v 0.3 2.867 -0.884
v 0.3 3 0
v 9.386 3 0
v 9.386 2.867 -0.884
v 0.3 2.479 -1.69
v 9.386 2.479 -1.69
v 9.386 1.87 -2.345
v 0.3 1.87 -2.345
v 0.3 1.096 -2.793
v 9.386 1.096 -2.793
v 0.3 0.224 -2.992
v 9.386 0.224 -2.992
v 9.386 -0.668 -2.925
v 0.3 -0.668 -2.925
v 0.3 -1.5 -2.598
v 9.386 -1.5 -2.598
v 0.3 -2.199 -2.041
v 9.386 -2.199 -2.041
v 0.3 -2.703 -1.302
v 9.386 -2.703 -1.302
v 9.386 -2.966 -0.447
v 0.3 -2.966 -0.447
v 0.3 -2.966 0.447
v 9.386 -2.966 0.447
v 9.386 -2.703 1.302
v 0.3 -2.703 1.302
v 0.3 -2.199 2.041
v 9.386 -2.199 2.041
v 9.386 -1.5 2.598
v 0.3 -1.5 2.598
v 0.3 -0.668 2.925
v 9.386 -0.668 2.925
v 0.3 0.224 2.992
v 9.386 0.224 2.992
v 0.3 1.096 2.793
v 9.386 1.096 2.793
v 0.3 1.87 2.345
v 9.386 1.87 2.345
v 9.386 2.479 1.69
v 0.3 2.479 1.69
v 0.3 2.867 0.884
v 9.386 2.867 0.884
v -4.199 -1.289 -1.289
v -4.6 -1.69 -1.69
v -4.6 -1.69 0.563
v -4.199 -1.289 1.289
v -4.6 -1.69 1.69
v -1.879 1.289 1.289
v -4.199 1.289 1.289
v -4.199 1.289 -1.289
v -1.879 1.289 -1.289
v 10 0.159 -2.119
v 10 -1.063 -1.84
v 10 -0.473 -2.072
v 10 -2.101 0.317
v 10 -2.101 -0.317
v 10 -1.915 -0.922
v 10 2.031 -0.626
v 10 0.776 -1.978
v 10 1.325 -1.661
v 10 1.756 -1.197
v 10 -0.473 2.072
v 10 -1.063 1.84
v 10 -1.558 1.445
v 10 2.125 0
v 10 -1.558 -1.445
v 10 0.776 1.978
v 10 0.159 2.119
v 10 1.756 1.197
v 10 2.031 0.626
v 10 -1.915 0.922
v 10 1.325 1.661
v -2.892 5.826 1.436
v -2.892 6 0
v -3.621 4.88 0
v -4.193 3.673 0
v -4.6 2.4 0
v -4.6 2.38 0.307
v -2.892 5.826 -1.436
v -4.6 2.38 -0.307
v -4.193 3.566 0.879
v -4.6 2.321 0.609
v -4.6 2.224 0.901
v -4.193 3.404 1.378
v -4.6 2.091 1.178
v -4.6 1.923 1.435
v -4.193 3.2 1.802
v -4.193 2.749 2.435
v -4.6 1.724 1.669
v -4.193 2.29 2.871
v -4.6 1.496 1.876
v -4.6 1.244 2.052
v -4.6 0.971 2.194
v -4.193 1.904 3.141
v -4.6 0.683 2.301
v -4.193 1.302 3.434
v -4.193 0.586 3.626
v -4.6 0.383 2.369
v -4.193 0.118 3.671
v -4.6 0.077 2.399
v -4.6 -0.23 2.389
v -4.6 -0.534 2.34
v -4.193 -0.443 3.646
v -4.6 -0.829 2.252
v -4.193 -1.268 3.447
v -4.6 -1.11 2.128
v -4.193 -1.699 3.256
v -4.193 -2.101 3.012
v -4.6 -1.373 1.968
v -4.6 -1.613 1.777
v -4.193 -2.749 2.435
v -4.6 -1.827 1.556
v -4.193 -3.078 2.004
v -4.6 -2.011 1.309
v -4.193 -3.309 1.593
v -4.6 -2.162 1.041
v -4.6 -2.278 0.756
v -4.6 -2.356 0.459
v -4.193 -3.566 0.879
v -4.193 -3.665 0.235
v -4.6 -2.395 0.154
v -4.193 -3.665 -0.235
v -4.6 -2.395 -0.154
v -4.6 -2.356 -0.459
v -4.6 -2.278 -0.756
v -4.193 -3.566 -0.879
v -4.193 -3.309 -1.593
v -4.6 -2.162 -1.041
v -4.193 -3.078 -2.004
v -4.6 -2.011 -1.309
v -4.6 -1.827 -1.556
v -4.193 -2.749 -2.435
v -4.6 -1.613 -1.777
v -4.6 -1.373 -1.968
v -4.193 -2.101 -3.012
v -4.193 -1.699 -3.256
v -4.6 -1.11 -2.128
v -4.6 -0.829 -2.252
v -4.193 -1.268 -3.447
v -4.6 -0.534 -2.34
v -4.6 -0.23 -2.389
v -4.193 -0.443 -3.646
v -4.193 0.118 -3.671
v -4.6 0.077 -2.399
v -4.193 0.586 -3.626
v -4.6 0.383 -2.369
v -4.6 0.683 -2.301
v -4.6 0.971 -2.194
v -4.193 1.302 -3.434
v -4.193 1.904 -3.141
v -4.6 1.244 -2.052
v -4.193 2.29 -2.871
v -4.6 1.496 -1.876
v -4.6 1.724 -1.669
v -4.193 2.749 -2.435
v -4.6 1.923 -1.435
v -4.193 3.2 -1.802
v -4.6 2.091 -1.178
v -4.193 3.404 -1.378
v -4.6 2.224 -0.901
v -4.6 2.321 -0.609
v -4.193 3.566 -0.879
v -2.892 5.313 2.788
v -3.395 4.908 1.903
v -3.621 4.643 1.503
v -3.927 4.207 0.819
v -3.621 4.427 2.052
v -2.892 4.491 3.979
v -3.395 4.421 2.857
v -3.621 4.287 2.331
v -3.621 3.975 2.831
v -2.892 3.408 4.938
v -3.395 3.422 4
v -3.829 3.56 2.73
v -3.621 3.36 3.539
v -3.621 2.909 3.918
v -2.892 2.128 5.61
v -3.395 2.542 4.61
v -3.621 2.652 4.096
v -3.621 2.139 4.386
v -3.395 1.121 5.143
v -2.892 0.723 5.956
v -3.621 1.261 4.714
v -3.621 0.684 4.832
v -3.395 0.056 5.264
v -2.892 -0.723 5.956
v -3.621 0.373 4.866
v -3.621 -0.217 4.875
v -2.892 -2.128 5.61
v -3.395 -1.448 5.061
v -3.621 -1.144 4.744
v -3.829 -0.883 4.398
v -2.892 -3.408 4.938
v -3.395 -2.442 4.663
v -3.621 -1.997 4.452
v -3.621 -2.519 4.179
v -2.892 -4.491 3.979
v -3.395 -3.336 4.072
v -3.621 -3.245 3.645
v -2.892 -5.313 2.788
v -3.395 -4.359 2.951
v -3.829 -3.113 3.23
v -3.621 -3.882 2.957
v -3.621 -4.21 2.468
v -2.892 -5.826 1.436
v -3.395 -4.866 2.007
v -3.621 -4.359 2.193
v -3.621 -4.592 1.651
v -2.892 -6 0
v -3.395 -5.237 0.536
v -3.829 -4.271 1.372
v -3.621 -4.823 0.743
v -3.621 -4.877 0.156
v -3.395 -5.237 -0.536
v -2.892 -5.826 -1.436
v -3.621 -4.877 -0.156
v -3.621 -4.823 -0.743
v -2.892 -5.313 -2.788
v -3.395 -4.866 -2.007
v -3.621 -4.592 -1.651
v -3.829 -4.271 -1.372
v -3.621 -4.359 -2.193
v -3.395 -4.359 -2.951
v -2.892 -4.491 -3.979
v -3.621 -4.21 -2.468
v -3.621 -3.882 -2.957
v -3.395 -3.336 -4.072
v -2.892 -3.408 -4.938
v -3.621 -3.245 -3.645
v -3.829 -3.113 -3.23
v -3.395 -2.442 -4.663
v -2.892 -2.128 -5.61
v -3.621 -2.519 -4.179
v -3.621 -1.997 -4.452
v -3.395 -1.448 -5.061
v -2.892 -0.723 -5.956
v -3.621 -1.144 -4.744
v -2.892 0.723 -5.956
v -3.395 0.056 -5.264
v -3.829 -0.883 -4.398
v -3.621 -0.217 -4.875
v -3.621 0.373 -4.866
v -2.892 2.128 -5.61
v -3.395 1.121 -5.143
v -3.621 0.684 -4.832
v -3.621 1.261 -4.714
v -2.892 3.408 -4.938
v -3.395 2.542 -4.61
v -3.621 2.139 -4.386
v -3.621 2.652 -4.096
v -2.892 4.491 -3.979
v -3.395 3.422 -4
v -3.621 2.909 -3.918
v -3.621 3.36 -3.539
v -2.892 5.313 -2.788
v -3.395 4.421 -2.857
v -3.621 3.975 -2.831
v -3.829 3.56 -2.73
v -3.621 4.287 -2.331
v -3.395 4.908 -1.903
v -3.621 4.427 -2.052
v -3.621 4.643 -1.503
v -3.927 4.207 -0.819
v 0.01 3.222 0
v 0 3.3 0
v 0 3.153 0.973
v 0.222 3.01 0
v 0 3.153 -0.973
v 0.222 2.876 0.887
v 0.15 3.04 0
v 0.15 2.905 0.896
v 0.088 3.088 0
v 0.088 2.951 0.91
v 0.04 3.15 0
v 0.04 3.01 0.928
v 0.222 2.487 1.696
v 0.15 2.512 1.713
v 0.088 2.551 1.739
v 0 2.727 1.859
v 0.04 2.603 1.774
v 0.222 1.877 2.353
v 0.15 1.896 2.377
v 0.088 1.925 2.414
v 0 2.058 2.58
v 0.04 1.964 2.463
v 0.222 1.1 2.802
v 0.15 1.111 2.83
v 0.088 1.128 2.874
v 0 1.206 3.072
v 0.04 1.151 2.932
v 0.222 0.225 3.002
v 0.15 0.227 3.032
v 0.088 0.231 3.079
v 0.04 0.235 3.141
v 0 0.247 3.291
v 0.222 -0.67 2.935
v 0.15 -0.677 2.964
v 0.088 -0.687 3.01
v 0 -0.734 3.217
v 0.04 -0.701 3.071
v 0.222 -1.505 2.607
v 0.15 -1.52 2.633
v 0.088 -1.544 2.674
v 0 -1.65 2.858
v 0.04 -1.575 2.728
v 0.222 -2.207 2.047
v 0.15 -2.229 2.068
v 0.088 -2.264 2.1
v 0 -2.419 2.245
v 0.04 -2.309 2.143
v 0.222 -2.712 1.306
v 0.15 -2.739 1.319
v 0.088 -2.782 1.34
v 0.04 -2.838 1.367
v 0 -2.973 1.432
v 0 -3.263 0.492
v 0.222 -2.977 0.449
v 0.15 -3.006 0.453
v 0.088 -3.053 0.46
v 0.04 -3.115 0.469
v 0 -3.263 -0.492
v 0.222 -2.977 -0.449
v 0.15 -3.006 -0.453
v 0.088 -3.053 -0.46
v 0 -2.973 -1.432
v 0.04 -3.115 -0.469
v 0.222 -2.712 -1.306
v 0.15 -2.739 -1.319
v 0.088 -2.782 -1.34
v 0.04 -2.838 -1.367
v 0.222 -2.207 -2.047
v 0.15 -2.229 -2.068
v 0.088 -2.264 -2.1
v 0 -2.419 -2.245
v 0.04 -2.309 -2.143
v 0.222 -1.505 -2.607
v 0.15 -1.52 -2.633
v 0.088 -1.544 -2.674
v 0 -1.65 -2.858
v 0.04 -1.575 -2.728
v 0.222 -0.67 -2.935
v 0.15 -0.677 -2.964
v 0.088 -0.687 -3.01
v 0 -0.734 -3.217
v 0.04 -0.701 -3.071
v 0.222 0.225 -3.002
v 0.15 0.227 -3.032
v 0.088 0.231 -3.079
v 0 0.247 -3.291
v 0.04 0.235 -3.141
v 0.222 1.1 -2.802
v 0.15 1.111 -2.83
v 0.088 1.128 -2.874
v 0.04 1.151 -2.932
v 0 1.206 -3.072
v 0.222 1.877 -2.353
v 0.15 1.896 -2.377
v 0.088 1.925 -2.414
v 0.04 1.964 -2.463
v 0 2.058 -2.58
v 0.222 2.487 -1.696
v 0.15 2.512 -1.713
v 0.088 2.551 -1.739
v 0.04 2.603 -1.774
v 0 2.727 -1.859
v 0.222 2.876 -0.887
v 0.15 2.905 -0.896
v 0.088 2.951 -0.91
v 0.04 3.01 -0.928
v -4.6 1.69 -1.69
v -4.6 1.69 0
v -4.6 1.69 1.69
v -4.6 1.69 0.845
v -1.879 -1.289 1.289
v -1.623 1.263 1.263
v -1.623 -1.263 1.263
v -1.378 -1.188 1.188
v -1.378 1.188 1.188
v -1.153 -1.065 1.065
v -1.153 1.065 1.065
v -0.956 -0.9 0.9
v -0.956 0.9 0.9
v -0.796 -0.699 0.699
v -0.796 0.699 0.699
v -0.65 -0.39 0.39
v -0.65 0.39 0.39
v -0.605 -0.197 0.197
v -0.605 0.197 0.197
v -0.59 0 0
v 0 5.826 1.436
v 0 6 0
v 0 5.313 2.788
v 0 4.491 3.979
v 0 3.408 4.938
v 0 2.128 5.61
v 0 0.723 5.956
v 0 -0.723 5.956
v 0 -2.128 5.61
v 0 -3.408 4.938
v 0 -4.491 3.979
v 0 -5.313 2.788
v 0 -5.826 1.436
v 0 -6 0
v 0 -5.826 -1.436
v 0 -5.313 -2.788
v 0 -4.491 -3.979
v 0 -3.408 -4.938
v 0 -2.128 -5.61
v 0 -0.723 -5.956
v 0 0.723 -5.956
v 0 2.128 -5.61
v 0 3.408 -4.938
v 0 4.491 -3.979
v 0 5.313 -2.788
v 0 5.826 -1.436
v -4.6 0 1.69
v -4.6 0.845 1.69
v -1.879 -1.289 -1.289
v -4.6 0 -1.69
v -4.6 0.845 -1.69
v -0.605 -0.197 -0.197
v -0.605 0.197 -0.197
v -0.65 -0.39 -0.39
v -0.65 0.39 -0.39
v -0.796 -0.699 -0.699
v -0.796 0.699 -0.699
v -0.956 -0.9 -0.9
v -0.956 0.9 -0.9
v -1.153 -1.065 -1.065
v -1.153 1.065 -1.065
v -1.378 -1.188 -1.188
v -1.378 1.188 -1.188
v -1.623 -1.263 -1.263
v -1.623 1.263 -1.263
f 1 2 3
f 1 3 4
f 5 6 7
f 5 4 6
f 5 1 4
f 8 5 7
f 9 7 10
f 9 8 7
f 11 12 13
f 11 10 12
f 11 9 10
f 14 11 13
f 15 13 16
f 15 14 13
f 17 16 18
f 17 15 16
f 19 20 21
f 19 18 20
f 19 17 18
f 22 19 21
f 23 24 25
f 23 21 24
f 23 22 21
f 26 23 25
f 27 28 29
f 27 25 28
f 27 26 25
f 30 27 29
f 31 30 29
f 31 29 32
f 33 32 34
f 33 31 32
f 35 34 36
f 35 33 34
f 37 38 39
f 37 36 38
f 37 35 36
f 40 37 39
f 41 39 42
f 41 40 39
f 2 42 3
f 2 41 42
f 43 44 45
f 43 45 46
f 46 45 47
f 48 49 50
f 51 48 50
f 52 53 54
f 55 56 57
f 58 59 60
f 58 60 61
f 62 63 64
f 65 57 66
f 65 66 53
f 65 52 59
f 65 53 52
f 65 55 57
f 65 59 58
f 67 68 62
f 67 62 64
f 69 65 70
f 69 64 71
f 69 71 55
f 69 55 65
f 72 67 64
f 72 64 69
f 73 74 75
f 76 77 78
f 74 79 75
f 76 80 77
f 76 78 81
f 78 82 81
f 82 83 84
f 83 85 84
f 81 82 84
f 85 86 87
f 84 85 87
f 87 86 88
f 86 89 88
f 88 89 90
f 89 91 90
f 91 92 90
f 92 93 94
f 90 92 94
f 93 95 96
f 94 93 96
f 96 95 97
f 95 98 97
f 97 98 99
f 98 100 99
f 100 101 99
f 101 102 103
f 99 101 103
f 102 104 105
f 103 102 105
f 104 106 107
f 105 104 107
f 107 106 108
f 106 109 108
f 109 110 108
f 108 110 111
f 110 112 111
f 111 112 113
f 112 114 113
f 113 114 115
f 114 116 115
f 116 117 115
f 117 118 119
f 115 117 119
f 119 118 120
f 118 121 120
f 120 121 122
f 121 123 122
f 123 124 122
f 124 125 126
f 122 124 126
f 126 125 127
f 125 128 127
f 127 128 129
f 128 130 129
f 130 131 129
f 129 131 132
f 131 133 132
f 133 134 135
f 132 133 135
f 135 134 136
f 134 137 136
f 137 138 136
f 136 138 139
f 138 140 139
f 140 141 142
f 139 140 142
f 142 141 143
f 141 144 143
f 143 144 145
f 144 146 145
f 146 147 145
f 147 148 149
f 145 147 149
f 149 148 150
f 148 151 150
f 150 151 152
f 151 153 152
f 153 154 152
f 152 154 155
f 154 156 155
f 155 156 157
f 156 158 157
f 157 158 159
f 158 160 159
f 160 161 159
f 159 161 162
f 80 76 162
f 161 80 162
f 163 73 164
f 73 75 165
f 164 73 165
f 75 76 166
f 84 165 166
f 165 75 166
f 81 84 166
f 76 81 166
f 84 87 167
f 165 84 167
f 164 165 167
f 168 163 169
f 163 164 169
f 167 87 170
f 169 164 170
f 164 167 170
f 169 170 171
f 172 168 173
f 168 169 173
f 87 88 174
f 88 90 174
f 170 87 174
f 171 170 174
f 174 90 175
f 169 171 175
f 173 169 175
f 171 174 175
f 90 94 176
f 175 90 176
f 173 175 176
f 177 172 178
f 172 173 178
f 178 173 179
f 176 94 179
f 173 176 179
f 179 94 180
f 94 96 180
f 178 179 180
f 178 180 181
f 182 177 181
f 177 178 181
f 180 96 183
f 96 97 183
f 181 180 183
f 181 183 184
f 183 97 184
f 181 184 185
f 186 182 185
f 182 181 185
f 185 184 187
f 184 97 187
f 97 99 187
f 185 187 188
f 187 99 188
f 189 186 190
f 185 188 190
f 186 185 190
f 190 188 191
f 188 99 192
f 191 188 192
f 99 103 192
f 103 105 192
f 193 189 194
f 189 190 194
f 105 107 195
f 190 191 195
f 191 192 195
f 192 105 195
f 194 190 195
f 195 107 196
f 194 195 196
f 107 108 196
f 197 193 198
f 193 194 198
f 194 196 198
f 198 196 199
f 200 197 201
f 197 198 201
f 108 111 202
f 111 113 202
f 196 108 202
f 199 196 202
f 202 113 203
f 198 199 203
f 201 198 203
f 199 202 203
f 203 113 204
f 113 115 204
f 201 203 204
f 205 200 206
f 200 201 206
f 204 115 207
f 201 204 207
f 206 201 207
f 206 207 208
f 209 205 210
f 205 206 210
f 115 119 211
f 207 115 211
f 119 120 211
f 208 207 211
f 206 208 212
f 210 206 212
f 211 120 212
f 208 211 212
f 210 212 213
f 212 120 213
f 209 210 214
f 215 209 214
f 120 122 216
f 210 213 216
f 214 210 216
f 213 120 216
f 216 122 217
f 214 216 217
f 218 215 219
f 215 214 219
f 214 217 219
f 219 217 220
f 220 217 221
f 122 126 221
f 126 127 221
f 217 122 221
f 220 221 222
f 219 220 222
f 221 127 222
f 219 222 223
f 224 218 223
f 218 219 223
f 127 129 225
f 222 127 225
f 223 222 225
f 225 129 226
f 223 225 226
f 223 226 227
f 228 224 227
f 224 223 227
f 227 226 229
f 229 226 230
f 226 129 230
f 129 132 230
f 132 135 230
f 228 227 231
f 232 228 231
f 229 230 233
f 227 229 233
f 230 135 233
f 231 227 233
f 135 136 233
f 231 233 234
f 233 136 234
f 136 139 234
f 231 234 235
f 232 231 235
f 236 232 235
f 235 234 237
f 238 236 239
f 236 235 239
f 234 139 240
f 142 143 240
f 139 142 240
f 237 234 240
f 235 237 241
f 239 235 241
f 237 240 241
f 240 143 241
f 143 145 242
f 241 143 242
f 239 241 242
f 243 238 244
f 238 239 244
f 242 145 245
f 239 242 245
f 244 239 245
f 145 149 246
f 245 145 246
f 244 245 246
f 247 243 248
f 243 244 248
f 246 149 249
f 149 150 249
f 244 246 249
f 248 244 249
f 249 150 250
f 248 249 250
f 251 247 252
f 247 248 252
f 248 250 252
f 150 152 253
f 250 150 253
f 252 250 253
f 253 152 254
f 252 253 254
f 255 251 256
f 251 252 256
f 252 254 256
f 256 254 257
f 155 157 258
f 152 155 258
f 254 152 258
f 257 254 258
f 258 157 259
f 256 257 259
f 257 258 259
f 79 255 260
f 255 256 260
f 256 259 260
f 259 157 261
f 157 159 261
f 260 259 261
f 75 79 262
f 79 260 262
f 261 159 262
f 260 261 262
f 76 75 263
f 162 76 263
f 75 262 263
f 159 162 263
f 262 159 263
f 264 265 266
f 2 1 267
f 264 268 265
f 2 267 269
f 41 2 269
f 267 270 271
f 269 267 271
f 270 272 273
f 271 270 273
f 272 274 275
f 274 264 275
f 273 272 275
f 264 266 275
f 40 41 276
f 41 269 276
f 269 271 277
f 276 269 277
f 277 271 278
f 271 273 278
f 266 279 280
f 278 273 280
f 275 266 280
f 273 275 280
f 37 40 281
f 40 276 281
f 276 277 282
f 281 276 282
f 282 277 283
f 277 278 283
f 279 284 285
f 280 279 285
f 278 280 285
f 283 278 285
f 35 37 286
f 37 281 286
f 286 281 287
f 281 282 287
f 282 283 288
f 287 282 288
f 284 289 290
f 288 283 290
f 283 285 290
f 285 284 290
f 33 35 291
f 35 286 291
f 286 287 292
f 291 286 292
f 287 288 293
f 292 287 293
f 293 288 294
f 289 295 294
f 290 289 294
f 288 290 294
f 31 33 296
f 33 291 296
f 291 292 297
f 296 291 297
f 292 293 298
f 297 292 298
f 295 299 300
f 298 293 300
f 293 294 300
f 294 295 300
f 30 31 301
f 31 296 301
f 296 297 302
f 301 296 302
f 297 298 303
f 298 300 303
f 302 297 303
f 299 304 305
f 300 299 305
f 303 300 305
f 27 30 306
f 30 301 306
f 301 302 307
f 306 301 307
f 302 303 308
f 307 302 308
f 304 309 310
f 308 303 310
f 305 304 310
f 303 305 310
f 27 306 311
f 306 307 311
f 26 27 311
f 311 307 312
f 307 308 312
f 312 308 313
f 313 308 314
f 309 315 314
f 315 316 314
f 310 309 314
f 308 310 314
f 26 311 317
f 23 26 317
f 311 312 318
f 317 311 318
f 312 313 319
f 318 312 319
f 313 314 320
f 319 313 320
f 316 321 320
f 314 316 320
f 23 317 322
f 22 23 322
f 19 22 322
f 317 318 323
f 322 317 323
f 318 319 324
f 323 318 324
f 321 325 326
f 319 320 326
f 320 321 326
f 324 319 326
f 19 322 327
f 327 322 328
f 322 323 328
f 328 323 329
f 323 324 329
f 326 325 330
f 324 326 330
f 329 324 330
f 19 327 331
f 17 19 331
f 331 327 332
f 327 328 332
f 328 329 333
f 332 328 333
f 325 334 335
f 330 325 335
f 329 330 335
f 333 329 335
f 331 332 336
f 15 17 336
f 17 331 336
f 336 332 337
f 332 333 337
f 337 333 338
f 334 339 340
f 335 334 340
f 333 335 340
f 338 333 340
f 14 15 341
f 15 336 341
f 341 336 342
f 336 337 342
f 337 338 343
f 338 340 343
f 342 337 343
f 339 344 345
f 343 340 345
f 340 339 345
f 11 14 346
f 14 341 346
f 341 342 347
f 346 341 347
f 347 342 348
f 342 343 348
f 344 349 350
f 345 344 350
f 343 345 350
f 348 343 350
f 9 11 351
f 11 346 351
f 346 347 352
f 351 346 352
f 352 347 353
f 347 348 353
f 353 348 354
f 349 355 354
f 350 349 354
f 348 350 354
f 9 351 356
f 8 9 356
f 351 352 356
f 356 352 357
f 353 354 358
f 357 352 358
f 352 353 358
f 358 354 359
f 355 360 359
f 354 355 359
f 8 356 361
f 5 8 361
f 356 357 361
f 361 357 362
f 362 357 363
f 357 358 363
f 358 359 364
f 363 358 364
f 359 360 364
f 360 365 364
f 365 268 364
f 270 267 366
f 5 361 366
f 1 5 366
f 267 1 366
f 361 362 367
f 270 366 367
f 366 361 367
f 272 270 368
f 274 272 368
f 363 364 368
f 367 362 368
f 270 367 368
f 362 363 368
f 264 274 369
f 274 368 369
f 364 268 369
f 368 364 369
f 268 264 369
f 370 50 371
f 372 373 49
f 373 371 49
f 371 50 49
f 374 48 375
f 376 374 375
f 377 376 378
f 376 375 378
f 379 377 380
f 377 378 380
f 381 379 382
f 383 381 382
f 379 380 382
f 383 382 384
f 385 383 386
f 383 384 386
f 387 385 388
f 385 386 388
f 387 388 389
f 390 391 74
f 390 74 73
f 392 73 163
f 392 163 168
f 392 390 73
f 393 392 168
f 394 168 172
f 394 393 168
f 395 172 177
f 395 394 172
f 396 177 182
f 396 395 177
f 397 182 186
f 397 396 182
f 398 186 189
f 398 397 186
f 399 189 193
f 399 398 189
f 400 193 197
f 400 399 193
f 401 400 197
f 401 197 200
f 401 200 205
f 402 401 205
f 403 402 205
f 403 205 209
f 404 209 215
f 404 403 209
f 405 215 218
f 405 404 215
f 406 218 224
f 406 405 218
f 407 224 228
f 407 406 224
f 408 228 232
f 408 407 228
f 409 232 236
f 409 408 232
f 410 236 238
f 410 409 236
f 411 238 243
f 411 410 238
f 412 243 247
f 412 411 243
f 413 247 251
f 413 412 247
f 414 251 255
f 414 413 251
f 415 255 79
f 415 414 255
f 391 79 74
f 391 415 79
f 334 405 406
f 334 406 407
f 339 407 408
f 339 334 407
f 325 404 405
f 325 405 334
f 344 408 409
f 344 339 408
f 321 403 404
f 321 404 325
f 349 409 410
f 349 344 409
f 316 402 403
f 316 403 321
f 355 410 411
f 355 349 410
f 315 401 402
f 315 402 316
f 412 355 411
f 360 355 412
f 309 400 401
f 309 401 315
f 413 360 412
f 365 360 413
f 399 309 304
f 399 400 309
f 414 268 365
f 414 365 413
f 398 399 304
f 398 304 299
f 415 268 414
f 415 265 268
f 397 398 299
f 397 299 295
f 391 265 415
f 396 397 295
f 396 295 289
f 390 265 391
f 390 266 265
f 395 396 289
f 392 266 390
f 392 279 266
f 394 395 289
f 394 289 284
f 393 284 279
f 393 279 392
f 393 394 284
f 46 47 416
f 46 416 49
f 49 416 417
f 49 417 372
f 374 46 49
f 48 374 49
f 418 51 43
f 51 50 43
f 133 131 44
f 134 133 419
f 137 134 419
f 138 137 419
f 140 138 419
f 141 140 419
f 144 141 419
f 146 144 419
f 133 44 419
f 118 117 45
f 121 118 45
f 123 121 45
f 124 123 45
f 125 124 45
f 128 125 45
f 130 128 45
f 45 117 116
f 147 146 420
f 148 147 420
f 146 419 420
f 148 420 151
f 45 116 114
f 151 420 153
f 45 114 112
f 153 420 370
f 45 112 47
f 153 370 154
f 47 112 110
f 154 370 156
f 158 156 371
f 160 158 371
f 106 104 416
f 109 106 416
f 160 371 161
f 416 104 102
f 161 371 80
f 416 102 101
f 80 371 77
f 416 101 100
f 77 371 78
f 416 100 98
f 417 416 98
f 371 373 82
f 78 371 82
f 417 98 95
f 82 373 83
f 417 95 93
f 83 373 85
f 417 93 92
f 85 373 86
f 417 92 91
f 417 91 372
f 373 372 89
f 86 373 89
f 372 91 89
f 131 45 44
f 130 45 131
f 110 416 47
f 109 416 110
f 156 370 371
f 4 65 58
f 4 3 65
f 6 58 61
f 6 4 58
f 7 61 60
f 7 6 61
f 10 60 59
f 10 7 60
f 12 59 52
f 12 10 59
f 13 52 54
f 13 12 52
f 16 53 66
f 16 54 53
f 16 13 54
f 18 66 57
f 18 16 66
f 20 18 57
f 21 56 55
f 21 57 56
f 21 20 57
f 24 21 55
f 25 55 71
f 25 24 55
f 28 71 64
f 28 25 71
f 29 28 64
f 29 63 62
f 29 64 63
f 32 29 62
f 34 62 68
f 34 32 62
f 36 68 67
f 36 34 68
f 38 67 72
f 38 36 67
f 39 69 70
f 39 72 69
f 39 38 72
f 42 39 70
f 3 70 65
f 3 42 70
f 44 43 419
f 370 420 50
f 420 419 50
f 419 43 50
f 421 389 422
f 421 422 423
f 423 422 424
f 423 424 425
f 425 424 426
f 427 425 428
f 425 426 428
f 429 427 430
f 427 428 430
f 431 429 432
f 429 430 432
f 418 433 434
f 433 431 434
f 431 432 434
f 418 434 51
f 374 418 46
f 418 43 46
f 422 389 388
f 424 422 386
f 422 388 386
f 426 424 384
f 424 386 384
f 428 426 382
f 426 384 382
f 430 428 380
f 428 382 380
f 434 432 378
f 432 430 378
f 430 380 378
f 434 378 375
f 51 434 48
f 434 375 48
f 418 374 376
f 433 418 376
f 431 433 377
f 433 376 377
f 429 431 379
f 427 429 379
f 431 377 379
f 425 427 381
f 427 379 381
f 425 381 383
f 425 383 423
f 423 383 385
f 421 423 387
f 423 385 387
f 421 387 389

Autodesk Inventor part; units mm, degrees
ref_plane "YZ Plane" through (0, 0, 0) normal (1, 0, 0) x (0, 1, 0)
sketch "Sketch1" plane through (0, 0, 0) normal (0, 0, 1) x (1, 0, 0)
  line L0 (-0.59, 0) -> (10, 0)
  line L1 (10, 0) -> (10, 3)
  line L2 (10, 3) -> (0, 3)
  line L3 (0, 3) -> (0, 6)
  line L4 (-8.1003, 0) -> (13.0167, 0) projected
  line L5 (0, -1.2172) -> (0, 7.3031) projected
  line L6 (-4.6, 2.3998) -> (-5.0836, 2.3998) construction
  line L7 (-4.6, 0) -> (-0.59, 0)
  line L8 (0, 0) -> (-0.59, 0)
  line L9 (-4.6, 0) -> (-4.6, 6)
  arc A0 (-2.8922, 6) -> (-4.6, 2.3998) centre (5.1078, 0) ccw
  line L10 (-4.6, 6) -> (0, 6)
  dimension "d0" = 10
  dimension "d1" = 6
  dimension "d2" = 12
  dimension "d4" = 4.7996
  dimension "d13" = 4.6
  dimension "d14" = 4.01
  dimension "d46" = 10
  dimension "d47" = 0
revolve "Body" add sketch "Sketch1" angle 360 about axis through (-0.59, 0, 0) along (1, 0, 0) contours L4 L9 A0 L10 L3 L5 L0 | L5 L2 L1 L0
ref_plane "IDS_WORKPLANE{1}" through (-4.6, 0, 0) normal (1, 0, 0) x (0, 0, -1)
sketch "Sketch2" plane through (-4.6, 0, 0) normal (1, 0, 0) x (0, 0, -1)
  line L0 (0, -8.4) -> (0, 8.4) projected
  line L1 (8.4, 0) -> (-8.4, 0) projected
  line L2 (-1.289, 1.289) -> (1.289, 1.289)
  line L3 (1.289, 1.289) -> (1.289, -1.289)
  line L4 (1.289, -1.289) -> (-1.289, -1.289)
  line L5 (-1.289, -1.289) -> (-1.289, 1.289)
  line L6 (0, 1.289) -> (0, -1.289) construction
  line L7 (-1.289, 0) -> (1.289, 0) construction
  dimension "d7" = 2.578
  dimension "d9" = 2.578
extrude "Extrusion" cut sketch "Sketch2" along normal blind 4.01
fillet "Fillet1" radius 1.289 4 edges at (-0.59, 0, -1.289) (-0.59, -1.289, 0) (-0.59, 0, 1.289) (-0.59, 1.289, 0)
chamfer "Chamfer1" distance 0.401 angle 45 4 edges at (-4.6, 1.289, 0) (-4.6, 0, -1.289) (-4.6, -1.289, 0) (-4.6, 0, 1.289)
thread "Thread" size "M6x1" class "6g" standard "ISO Metric profile" length 9
chamfer "Chamfer2" distance 0.875 distance2 0.6135 1 edges at (10, -3, 0) measured on face at (10, 0.705, 0.3049)
ref_plane "Work Plane2" through (69.85, 0, 0) normal (0, 0, -1) x (1, 0, 0)
fillet "Fillet2" radius 0.3 1 edges at (0, -3, 0)
equation "\"d0\" = NLG"
equation "\"d1\" = GD"
equation "\"d2\" = KOD"
equation "\"d4\" = 1.42 * KOM"
equation "\"d13\" = KOH"
equation "\"d14\" = STI"
equation "\"d46\" = KR"
equation "\"d7\" = KOM - 0.2 * STI"
equation "\"d9\" = KOM - 0.2 * STI"
equation "\"d48\" = STI"
equation "\"d50\" = -0.1 * STI + 0.5 * KOM"
equation "\"d51\" = 0.1 * STI"
equation "\"d18\" = GEL"
equation "\"d20\" = -0.5 * SPD + 0.5 * GD"
equation "\"d21\" = GUL"
equation "\"d44\" = R"
equation "\"GD\" = 6"
equation "\"NLG\" = 10"
equation "\"GEL\" = 9"
equation "\"KOD\" = 12"
equation "\"KOH\" = 4.6"
equation "\"SPD\" = 4.25"
equation "\"KR\" = 10"
equation "\"RR\" = 2"
equation "\"GUL\" = 0.61345 * PTC"
equation "\"KEWI\" = 0"
equation "\"SDM\" = 3.38"
equation "\"STI\" = 4.01"
equation "\"d6\" = -KOH"
equation "\"R\" = 0.3"
equation "\"KOM\" = 3.38"
equation "\"PTC\" = 1"
properties part number "ANSI B18.6.7M - M6x1 x 10, SRPHMSTIM" material "Steel, Mild"
